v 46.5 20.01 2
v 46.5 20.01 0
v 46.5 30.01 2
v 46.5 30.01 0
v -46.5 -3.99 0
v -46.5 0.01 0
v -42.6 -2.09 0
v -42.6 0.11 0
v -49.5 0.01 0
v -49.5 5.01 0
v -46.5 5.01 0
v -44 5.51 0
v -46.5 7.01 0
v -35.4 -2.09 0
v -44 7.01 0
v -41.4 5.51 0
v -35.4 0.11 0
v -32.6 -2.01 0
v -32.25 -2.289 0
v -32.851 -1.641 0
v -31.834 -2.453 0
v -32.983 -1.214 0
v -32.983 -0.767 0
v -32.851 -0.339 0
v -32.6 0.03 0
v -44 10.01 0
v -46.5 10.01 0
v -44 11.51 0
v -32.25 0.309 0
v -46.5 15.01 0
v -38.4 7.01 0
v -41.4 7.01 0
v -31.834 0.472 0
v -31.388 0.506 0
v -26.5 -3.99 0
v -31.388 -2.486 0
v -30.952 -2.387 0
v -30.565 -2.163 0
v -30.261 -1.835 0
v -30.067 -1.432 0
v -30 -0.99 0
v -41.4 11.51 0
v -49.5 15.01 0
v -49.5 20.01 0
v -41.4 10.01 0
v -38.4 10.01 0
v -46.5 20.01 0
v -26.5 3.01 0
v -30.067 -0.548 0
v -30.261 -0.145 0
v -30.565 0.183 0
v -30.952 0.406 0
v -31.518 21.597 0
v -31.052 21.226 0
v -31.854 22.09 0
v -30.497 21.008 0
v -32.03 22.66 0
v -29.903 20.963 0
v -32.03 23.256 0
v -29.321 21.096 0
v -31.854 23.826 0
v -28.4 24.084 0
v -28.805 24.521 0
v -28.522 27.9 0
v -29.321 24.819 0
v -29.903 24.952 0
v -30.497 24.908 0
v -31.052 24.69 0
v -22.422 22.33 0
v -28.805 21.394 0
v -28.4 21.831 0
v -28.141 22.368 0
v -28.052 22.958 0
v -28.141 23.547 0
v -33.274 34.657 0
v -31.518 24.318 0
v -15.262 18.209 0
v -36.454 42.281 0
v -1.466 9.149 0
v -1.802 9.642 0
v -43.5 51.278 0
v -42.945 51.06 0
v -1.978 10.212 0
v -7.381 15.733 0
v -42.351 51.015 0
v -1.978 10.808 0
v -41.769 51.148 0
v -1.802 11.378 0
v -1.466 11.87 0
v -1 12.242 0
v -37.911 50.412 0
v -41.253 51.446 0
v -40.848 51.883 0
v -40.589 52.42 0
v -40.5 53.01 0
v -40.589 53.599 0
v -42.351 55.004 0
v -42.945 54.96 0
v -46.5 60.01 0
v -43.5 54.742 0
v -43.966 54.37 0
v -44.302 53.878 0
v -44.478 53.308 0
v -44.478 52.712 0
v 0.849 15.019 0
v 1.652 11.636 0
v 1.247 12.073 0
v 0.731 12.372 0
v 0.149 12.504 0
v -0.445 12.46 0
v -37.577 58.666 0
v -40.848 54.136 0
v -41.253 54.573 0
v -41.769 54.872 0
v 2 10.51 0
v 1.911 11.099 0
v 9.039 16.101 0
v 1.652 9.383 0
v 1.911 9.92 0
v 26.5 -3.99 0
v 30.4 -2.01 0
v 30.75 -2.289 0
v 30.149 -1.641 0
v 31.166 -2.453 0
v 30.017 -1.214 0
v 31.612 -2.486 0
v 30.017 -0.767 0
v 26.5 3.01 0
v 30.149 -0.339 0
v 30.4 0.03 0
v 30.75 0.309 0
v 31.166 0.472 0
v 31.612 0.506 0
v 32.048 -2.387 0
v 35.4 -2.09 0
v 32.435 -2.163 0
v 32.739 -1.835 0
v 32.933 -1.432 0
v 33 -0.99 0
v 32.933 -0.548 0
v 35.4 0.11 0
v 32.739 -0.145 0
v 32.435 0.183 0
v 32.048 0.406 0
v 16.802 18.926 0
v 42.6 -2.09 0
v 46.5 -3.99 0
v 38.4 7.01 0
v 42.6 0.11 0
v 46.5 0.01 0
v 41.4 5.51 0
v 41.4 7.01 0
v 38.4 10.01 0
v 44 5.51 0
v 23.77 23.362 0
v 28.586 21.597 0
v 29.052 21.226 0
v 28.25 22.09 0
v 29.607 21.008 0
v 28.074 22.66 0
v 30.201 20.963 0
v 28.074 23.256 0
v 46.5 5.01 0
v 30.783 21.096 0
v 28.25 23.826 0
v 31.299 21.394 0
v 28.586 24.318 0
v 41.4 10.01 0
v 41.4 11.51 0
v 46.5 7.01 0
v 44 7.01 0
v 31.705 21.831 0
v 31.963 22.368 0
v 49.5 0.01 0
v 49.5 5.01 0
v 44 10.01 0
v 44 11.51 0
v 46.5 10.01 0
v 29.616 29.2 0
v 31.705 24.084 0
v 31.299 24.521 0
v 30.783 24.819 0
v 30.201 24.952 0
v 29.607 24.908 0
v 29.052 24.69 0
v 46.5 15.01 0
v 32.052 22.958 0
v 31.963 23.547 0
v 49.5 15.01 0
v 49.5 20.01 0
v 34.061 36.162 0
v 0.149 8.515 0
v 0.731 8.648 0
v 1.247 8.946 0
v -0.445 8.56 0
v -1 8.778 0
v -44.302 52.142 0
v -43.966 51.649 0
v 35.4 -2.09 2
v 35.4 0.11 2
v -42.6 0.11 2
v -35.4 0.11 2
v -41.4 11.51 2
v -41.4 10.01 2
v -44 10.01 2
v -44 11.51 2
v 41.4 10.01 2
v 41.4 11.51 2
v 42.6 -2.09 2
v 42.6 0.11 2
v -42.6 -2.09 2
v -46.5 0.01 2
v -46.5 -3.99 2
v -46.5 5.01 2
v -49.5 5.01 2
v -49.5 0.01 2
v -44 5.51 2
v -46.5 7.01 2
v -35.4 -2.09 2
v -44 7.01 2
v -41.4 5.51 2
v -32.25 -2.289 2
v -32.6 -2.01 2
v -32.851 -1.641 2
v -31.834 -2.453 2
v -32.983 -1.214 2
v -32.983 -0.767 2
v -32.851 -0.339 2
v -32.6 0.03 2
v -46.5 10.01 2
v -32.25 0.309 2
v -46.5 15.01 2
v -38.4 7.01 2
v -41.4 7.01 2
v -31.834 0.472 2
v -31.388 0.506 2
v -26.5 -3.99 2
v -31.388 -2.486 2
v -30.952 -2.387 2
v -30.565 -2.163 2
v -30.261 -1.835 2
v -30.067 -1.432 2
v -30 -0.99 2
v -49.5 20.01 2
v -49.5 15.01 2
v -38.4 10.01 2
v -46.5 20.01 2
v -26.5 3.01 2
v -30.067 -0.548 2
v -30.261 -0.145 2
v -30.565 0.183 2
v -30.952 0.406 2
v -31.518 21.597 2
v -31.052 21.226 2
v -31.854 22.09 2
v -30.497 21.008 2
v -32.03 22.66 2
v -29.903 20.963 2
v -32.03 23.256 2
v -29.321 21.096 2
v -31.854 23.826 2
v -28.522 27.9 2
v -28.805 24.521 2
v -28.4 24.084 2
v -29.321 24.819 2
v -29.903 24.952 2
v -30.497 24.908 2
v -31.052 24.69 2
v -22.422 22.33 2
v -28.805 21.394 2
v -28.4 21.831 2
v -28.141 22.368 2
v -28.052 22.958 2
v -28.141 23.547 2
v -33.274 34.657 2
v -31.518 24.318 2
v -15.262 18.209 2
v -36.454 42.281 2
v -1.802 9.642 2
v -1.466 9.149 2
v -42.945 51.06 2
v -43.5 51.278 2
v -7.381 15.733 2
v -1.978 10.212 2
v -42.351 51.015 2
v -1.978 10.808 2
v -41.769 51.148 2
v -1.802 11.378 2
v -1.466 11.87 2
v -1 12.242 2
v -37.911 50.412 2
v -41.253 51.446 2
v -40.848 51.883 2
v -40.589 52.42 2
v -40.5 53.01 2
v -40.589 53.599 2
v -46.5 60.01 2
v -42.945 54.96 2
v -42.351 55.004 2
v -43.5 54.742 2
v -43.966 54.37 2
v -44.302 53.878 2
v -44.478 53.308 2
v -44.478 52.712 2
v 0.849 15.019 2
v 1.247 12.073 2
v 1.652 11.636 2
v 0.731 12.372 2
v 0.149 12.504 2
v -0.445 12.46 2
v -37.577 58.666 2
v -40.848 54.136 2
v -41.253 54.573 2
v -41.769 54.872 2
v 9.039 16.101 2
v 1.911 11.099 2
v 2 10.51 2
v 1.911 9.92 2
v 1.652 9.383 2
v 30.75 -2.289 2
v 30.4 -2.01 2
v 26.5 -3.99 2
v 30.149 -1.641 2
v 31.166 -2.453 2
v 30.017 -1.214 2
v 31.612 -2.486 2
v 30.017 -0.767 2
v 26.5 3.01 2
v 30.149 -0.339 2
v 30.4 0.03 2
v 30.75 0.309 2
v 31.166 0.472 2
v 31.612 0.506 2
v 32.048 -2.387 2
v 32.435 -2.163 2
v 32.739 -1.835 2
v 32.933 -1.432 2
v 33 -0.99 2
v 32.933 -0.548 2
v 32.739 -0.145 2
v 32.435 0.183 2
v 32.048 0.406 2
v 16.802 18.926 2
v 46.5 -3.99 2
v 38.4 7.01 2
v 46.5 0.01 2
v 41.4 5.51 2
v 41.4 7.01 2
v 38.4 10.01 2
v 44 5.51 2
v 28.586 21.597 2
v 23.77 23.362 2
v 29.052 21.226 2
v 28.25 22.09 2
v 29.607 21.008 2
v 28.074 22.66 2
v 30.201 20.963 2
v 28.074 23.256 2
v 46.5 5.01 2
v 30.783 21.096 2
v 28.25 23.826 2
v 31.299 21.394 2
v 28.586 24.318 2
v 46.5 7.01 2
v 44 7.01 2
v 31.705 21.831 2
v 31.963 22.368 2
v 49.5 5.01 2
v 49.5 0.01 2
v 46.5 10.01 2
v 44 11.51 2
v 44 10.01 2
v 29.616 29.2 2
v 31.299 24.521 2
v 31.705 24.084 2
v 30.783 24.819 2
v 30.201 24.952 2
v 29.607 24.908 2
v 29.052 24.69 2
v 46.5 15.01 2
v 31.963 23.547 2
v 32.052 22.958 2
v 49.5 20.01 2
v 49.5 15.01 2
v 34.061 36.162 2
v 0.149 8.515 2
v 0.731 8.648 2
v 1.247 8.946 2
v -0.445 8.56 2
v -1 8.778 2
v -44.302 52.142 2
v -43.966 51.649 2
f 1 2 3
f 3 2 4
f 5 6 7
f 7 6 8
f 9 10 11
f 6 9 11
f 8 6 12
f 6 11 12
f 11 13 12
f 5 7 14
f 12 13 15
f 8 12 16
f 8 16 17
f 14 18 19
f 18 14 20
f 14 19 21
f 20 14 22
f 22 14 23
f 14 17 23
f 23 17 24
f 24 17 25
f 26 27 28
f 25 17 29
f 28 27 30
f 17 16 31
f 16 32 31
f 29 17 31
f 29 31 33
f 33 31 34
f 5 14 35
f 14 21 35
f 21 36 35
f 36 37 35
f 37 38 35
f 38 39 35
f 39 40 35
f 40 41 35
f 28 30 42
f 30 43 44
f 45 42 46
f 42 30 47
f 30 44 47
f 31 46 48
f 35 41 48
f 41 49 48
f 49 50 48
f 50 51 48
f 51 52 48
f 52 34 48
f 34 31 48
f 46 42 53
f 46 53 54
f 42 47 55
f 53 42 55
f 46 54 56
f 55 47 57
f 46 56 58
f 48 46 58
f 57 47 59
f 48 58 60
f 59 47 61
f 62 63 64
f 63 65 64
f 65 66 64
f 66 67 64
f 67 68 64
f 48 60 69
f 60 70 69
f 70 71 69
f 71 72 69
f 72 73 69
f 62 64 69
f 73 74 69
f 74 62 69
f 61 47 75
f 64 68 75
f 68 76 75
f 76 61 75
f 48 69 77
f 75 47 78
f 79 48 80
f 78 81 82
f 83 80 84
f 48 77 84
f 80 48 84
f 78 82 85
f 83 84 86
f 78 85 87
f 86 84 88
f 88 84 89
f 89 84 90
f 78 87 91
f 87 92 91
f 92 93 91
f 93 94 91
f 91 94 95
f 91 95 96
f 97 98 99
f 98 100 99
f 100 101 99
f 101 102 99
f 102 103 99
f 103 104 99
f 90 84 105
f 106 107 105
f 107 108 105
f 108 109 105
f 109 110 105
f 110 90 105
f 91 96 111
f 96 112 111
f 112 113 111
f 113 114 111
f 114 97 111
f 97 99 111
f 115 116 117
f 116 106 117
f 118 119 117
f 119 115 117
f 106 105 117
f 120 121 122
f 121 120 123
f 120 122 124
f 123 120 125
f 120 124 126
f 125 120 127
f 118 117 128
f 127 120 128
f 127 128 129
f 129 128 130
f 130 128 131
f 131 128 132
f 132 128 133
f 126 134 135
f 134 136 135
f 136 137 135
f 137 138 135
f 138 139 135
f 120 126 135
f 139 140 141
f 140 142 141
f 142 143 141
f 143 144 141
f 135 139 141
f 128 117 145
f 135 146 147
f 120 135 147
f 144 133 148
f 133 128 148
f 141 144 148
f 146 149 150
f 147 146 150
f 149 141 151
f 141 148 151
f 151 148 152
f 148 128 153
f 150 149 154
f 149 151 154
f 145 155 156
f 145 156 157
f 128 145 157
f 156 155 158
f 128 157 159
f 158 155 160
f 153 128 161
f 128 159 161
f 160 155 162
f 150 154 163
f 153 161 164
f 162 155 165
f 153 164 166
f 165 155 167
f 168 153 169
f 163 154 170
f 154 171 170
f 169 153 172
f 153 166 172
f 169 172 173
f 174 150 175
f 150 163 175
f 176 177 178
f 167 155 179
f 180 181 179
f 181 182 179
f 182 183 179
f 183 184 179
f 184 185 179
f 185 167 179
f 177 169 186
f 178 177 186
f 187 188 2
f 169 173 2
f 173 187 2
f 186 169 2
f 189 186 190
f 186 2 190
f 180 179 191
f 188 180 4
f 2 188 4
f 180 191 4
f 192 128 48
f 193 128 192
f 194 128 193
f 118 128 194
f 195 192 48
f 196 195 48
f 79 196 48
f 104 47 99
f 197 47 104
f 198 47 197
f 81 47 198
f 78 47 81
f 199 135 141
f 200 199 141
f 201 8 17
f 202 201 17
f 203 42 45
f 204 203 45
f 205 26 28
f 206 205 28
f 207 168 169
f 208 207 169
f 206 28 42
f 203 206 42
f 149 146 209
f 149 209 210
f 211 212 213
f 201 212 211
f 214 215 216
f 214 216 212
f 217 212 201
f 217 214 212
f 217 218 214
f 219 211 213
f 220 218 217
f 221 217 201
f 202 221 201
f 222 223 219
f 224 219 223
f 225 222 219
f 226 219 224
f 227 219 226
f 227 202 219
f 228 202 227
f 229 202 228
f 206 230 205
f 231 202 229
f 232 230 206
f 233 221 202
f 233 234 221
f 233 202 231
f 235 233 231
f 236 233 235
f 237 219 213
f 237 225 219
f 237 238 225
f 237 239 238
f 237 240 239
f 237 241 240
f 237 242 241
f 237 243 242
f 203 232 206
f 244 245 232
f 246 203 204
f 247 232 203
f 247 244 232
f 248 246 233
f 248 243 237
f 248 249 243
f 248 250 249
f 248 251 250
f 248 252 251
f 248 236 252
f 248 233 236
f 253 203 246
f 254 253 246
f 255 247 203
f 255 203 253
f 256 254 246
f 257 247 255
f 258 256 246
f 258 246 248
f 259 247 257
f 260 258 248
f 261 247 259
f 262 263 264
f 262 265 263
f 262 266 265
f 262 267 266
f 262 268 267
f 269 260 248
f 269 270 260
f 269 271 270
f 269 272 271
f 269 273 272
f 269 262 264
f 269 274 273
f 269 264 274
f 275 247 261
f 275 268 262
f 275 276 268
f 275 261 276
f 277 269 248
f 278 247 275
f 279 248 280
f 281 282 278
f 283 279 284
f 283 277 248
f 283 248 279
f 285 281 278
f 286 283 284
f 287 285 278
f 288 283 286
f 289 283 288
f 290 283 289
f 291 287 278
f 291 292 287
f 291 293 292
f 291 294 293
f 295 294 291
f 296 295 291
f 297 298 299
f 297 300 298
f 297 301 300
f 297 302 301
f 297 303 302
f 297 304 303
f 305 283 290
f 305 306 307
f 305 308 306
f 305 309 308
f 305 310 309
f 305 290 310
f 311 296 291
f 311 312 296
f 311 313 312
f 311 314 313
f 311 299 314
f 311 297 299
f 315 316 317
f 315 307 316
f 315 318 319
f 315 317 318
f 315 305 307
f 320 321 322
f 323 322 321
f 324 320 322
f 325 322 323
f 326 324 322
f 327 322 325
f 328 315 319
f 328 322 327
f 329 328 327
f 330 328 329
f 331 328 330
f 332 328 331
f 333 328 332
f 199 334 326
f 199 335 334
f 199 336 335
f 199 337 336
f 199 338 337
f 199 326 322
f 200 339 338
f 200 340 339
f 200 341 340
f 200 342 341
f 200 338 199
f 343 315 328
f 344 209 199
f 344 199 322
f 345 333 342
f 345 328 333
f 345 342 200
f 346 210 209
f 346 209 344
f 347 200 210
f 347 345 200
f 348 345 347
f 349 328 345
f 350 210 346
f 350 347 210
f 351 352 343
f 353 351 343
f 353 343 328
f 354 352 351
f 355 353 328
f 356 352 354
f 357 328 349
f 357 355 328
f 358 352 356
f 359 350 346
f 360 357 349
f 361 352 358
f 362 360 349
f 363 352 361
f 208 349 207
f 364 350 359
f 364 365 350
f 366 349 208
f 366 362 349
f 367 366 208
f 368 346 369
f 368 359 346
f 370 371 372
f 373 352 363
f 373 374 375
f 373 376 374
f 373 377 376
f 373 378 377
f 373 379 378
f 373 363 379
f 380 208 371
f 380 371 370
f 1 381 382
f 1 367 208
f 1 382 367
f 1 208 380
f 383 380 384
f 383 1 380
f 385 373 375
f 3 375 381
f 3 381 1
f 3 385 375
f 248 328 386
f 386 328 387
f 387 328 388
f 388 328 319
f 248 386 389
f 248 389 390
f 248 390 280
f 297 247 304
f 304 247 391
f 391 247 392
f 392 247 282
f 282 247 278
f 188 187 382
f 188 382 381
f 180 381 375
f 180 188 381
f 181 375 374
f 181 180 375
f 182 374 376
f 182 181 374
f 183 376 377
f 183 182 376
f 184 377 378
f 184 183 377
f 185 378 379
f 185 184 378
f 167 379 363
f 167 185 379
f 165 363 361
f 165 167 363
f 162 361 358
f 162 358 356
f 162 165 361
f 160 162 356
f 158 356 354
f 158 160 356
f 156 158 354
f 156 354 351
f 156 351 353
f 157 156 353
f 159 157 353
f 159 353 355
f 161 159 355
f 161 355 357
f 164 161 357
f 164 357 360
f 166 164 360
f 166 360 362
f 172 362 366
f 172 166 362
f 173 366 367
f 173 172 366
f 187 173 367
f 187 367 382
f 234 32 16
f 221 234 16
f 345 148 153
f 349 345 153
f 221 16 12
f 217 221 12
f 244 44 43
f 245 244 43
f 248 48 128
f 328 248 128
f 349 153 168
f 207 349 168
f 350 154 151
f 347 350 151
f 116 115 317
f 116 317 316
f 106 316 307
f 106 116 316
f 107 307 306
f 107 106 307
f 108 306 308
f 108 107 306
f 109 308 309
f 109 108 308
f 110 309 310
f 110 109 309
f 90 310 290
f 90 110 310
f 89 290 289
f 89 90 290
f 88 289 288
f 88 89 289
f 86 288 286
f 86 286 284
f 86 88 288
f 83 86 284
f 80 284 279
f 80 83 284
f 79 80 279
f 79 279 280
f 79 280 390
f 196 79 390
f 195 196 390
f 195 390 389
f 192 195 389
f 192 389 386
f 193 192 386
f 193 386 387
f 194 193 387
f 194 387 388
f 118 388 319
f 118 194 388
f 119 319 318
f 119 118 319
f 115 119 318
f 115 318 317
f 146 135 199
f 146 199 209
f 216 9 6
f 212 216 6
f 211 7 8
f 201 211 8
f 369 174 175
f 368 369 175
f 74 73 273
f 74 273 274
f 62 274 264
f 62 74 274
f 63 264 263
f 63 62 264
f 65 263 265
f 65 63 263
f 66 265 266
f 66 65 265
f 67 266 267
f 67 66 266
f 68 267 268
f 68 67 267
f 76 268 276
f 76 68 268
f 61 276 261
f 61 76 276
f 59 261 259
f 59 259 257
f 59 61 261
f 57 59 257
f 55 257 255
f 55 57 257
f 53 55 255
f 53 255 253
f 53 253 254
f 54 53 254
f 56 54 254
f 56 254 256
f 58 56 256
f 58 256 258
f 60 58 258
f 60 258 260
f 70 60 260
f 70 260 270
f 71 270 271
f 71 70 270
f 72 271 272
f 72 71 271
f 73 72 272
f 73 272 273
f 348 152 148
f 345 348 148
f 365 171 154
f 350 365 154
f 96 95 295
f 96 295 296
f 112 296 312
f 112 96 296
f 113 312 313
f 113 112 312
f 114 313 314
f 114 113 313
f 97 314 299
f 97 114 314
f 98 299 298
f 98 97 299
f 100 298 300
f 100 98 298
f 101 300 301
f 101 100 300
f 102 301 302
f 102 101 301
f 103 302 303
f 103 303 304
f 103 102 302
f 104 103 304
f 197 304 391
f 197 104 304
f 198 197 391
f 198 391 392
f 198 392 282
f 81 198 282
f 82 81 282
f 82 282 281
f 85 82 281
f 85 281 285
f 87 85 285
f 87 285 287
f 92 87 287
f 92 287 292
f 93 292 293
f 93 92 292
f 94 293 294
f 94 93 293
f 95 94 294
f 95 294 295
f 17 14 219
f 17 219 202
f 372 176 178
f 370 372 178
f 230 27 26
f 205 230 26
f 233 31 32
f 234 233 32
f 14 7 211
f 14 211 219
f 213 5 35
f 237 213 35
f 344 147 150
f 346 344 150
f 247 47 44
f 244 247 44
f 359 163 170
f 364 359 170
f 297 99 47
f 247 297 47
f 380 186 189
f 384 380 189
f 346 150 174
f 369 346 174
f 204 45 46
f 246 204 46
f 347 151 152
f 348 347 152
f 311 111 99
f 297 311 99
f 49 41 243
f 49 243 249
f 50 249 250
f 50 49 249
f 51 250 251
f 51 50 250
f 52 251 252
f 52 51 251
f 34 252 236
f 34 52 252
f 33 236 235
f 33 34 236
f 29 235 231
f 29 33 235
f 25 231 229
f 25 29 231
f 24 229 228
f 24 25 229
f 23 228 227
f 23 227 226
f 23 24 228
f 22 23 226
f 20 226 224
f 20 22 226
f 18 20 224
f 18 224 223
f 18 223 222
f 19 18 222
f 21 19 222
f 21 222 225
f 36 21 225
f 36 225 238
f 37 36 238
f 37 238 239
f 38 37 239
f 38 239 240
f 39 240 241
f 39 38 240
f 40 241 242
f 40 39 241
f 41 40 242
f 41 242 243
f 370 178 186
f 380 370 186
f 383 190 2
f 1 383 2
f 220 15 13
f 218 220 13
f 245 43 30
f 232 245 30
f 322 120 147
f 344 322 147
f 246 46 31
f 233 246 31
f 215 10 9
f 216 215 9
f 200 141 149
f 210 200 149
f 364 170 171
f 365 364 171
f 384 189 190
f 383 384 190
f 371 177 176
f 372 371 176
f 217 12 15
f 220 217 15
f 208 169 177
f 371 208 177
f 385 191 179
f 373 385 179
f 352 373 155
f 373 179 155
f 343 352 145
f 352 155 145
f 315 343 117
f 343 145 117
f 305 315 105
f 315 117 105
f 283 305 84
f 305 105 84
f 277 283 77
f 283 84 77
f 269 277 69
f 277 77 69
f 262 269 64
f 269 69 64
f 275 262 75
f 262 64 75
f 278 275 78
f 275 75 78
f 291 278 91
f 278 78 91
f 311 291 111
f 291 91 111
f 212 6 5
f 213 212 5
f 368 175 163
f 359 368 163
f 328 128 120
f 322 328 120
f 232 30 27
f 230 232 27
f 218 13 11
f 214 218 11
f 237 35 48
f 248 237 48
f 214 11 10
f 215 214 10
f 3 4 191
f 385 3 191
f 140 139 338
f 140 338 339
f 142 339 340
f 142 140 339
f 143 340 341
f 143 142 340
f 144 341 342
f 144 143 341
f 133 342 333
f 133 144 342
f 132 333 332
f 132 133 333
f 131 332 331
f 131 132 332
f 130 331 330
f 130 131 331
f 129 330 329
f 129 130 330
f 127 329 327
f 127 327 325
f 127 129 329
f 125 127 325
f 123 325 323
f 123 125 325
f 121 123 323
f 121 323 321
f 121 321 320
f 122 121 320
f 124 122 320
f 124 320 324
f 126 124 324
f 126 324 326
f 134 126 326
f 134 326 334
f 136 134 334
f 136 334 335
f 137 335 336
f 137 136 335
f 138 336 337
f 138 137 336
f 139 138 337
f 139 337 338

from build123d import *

# Parameters (mm, degrees)
SKETCH_3_R      = 1.5
SKETCH_3_R_2    = 2
SKETCH_3_W      = 7.2
SKETCH_3_H      = 2.2
EXTRUDE_1_DEPTH = 2


with BuildPart() as part:
    # 草图3 → 凸台-拉伸1 (new body)
    with BuildSketch(Plane.XY):
        with BuildLine():
            Line((-46.5, 0.009783315), (-46.5, -3.990216685))
            Line((-46.5, -3.990216685), (-26.5, -3.990216685))
            Line((-26.5, -3.990216685), (-26.5, 3.009783315))
            Line((-26.5, 3.009783315), (26.5, 3.009783315))
            Line((26.5, 3.009783315), (26.5, -3.990216685))
            Line((26.5, -3.990216685), (46.5, -3.990216685))
            Line((46.5, -3.990216685), (46.5, 0.009783315))
            Line((46.5, 0.009783315), (49.5, 0.009783315))
            Line((49.5, 0.009783315), (49.5, 5.009783315))
            Line((49.5, 5.009783315), (46.5, 5.009783315))
            Line((46.5, 5.009783315), (46.5, 7.009783315))
            Line((46.5, 7.009783315), (44, 7.009783315))
            Line((44, 7.009783315), (44, 5.509783315))
            Line((44, 5.509783315), (41.4, 5.509783315))
            Line((41.4, 5.509783315), (41.4, 7.009783315))
            Line((41.4, 7.009783315), (38.4, 7.009783315))
            Line((38.4, 7.009783315), (38.4, 10.009783315))
            Line((38.4, 10.009783315), (41.4, 10.009783315))
            Line((41.4, 10.009783315), (41.4, 11.509783315))
            Line((41.4, 11.509783315), (44, 11.509783315))
            Line((44, 11.509783315), (44, 10.009783315))
            Line((44, 10.009783315), (46.5, 10.009783315))
            Line((46.5, 10.009783315), (46.5, 15.009783315))
            Line((46.5, 15.009783315), (49.5, 15.009783315))
            Line((49.5, 15.009783315), (49.5, 20.009783315))
            Line((49.5, 20.009783315), (46.5, 20.009783315))
            Line((46.5, 20.009783315), (46.5, 30.009783315))
            Line((46.5, 30.009783315), (34.06116735, 36.162324196))
            ThreePointArc((34.06116735, 36.162324196), (-11.38853896, 16.756491321), (-37.576612526, 58.666477673))
            Line((-37.576612526, 58.666477673), (-46.5, 60.009783315))
            Line((-46.5, 60.009783315), (-46.5, 20.009783315))
            Line((-46.5, 20.009783315), (-49.5, 20.009783315))
            Line((-49.5, 20.009783315), (-49.5, 15.009783315))
            Line((-49.5, 15.009783315), (-46.5, 15.009783315))
            Line((-46.5, 15.009783315), (-46.5, 10.009783315))
            Line((-46.5, 10.009783315), (-44, 10.009783315))
            Line((-44, 10.009783315), (-44, 11.509783315))
            Line((-44, 11.509783315), (-41.4, 11.509783315))
            Line((-41.4, 11.509783315), (-41.4, 10.009783315))
            Line((-41.4, 10.009783315), (-38.4, 10.009783315))
            Line((-38.4, 10.009783315), (-38.4, 7.009783315))
            Line((-38.4, 7.009783315), (-41.4, 7.009783315))
            Line((-41.4, 7.009783315), (-41.4, 5.509783315))
            Line((-41.4, 5.509783315), (-44, 5.509783315))
            Line((-44, 5.509783315), (-44, 7.009783315))
            Line((-44, 7.009783315), (-46.5, 7.009783315))
            Line((-46.5, 7.009783315), (-46.5, 5.009783315))
            Line((-46.5, 5.009783315), (-49.5, 5.009783315))
            Line((-49.5, 5.009783315), (-49.5, 0.009783315))
            Line((-49.5, 0.009783315), (-46.5, 0.009783315))
        make_face()
        with Locations((-31.5, -0.990216685)):
            Circle(SKETCH_3_R, mode=Mode.SUBTRACT)
        with Locations((31.5, -0.990216685)):
            Circle(SKETCH_3_R, mode=Mode.SUBTRACT)
        with Locations((0, 10.509783315)):
            Circle(SKETCH_3_R_2, mode=Mode.SUBTRACT)
        with Locations((-30.0520382, 22.957745114)):
            Circle(SKETCH_3_R_2, mode=Mode.SUBTRACT)
        with Locations((-42.5, 53.009783315)):
            Circle(SKETCH_3_R_2, mode=Mode.SUBTRACT)
        with Locations((30.0520382, 22.957745114)):
            Circle(SKETCH_3_R_2, mode=Mode.SUBTRACT)
        with Locations((-39, -0.990216685)):
            Rectangle(SKETCH_3_W, SKETCH_3_H, mode=Mode.SUBTRACT)
        with Locations((39, -0.990216685)):
            Rectangle(SKETCH_3_W, SKETCH_3_H, mode=Mode.SUBTRACT)
    extrude(amount=EXTRUDE_1_DEPTH)


solid = part.part
